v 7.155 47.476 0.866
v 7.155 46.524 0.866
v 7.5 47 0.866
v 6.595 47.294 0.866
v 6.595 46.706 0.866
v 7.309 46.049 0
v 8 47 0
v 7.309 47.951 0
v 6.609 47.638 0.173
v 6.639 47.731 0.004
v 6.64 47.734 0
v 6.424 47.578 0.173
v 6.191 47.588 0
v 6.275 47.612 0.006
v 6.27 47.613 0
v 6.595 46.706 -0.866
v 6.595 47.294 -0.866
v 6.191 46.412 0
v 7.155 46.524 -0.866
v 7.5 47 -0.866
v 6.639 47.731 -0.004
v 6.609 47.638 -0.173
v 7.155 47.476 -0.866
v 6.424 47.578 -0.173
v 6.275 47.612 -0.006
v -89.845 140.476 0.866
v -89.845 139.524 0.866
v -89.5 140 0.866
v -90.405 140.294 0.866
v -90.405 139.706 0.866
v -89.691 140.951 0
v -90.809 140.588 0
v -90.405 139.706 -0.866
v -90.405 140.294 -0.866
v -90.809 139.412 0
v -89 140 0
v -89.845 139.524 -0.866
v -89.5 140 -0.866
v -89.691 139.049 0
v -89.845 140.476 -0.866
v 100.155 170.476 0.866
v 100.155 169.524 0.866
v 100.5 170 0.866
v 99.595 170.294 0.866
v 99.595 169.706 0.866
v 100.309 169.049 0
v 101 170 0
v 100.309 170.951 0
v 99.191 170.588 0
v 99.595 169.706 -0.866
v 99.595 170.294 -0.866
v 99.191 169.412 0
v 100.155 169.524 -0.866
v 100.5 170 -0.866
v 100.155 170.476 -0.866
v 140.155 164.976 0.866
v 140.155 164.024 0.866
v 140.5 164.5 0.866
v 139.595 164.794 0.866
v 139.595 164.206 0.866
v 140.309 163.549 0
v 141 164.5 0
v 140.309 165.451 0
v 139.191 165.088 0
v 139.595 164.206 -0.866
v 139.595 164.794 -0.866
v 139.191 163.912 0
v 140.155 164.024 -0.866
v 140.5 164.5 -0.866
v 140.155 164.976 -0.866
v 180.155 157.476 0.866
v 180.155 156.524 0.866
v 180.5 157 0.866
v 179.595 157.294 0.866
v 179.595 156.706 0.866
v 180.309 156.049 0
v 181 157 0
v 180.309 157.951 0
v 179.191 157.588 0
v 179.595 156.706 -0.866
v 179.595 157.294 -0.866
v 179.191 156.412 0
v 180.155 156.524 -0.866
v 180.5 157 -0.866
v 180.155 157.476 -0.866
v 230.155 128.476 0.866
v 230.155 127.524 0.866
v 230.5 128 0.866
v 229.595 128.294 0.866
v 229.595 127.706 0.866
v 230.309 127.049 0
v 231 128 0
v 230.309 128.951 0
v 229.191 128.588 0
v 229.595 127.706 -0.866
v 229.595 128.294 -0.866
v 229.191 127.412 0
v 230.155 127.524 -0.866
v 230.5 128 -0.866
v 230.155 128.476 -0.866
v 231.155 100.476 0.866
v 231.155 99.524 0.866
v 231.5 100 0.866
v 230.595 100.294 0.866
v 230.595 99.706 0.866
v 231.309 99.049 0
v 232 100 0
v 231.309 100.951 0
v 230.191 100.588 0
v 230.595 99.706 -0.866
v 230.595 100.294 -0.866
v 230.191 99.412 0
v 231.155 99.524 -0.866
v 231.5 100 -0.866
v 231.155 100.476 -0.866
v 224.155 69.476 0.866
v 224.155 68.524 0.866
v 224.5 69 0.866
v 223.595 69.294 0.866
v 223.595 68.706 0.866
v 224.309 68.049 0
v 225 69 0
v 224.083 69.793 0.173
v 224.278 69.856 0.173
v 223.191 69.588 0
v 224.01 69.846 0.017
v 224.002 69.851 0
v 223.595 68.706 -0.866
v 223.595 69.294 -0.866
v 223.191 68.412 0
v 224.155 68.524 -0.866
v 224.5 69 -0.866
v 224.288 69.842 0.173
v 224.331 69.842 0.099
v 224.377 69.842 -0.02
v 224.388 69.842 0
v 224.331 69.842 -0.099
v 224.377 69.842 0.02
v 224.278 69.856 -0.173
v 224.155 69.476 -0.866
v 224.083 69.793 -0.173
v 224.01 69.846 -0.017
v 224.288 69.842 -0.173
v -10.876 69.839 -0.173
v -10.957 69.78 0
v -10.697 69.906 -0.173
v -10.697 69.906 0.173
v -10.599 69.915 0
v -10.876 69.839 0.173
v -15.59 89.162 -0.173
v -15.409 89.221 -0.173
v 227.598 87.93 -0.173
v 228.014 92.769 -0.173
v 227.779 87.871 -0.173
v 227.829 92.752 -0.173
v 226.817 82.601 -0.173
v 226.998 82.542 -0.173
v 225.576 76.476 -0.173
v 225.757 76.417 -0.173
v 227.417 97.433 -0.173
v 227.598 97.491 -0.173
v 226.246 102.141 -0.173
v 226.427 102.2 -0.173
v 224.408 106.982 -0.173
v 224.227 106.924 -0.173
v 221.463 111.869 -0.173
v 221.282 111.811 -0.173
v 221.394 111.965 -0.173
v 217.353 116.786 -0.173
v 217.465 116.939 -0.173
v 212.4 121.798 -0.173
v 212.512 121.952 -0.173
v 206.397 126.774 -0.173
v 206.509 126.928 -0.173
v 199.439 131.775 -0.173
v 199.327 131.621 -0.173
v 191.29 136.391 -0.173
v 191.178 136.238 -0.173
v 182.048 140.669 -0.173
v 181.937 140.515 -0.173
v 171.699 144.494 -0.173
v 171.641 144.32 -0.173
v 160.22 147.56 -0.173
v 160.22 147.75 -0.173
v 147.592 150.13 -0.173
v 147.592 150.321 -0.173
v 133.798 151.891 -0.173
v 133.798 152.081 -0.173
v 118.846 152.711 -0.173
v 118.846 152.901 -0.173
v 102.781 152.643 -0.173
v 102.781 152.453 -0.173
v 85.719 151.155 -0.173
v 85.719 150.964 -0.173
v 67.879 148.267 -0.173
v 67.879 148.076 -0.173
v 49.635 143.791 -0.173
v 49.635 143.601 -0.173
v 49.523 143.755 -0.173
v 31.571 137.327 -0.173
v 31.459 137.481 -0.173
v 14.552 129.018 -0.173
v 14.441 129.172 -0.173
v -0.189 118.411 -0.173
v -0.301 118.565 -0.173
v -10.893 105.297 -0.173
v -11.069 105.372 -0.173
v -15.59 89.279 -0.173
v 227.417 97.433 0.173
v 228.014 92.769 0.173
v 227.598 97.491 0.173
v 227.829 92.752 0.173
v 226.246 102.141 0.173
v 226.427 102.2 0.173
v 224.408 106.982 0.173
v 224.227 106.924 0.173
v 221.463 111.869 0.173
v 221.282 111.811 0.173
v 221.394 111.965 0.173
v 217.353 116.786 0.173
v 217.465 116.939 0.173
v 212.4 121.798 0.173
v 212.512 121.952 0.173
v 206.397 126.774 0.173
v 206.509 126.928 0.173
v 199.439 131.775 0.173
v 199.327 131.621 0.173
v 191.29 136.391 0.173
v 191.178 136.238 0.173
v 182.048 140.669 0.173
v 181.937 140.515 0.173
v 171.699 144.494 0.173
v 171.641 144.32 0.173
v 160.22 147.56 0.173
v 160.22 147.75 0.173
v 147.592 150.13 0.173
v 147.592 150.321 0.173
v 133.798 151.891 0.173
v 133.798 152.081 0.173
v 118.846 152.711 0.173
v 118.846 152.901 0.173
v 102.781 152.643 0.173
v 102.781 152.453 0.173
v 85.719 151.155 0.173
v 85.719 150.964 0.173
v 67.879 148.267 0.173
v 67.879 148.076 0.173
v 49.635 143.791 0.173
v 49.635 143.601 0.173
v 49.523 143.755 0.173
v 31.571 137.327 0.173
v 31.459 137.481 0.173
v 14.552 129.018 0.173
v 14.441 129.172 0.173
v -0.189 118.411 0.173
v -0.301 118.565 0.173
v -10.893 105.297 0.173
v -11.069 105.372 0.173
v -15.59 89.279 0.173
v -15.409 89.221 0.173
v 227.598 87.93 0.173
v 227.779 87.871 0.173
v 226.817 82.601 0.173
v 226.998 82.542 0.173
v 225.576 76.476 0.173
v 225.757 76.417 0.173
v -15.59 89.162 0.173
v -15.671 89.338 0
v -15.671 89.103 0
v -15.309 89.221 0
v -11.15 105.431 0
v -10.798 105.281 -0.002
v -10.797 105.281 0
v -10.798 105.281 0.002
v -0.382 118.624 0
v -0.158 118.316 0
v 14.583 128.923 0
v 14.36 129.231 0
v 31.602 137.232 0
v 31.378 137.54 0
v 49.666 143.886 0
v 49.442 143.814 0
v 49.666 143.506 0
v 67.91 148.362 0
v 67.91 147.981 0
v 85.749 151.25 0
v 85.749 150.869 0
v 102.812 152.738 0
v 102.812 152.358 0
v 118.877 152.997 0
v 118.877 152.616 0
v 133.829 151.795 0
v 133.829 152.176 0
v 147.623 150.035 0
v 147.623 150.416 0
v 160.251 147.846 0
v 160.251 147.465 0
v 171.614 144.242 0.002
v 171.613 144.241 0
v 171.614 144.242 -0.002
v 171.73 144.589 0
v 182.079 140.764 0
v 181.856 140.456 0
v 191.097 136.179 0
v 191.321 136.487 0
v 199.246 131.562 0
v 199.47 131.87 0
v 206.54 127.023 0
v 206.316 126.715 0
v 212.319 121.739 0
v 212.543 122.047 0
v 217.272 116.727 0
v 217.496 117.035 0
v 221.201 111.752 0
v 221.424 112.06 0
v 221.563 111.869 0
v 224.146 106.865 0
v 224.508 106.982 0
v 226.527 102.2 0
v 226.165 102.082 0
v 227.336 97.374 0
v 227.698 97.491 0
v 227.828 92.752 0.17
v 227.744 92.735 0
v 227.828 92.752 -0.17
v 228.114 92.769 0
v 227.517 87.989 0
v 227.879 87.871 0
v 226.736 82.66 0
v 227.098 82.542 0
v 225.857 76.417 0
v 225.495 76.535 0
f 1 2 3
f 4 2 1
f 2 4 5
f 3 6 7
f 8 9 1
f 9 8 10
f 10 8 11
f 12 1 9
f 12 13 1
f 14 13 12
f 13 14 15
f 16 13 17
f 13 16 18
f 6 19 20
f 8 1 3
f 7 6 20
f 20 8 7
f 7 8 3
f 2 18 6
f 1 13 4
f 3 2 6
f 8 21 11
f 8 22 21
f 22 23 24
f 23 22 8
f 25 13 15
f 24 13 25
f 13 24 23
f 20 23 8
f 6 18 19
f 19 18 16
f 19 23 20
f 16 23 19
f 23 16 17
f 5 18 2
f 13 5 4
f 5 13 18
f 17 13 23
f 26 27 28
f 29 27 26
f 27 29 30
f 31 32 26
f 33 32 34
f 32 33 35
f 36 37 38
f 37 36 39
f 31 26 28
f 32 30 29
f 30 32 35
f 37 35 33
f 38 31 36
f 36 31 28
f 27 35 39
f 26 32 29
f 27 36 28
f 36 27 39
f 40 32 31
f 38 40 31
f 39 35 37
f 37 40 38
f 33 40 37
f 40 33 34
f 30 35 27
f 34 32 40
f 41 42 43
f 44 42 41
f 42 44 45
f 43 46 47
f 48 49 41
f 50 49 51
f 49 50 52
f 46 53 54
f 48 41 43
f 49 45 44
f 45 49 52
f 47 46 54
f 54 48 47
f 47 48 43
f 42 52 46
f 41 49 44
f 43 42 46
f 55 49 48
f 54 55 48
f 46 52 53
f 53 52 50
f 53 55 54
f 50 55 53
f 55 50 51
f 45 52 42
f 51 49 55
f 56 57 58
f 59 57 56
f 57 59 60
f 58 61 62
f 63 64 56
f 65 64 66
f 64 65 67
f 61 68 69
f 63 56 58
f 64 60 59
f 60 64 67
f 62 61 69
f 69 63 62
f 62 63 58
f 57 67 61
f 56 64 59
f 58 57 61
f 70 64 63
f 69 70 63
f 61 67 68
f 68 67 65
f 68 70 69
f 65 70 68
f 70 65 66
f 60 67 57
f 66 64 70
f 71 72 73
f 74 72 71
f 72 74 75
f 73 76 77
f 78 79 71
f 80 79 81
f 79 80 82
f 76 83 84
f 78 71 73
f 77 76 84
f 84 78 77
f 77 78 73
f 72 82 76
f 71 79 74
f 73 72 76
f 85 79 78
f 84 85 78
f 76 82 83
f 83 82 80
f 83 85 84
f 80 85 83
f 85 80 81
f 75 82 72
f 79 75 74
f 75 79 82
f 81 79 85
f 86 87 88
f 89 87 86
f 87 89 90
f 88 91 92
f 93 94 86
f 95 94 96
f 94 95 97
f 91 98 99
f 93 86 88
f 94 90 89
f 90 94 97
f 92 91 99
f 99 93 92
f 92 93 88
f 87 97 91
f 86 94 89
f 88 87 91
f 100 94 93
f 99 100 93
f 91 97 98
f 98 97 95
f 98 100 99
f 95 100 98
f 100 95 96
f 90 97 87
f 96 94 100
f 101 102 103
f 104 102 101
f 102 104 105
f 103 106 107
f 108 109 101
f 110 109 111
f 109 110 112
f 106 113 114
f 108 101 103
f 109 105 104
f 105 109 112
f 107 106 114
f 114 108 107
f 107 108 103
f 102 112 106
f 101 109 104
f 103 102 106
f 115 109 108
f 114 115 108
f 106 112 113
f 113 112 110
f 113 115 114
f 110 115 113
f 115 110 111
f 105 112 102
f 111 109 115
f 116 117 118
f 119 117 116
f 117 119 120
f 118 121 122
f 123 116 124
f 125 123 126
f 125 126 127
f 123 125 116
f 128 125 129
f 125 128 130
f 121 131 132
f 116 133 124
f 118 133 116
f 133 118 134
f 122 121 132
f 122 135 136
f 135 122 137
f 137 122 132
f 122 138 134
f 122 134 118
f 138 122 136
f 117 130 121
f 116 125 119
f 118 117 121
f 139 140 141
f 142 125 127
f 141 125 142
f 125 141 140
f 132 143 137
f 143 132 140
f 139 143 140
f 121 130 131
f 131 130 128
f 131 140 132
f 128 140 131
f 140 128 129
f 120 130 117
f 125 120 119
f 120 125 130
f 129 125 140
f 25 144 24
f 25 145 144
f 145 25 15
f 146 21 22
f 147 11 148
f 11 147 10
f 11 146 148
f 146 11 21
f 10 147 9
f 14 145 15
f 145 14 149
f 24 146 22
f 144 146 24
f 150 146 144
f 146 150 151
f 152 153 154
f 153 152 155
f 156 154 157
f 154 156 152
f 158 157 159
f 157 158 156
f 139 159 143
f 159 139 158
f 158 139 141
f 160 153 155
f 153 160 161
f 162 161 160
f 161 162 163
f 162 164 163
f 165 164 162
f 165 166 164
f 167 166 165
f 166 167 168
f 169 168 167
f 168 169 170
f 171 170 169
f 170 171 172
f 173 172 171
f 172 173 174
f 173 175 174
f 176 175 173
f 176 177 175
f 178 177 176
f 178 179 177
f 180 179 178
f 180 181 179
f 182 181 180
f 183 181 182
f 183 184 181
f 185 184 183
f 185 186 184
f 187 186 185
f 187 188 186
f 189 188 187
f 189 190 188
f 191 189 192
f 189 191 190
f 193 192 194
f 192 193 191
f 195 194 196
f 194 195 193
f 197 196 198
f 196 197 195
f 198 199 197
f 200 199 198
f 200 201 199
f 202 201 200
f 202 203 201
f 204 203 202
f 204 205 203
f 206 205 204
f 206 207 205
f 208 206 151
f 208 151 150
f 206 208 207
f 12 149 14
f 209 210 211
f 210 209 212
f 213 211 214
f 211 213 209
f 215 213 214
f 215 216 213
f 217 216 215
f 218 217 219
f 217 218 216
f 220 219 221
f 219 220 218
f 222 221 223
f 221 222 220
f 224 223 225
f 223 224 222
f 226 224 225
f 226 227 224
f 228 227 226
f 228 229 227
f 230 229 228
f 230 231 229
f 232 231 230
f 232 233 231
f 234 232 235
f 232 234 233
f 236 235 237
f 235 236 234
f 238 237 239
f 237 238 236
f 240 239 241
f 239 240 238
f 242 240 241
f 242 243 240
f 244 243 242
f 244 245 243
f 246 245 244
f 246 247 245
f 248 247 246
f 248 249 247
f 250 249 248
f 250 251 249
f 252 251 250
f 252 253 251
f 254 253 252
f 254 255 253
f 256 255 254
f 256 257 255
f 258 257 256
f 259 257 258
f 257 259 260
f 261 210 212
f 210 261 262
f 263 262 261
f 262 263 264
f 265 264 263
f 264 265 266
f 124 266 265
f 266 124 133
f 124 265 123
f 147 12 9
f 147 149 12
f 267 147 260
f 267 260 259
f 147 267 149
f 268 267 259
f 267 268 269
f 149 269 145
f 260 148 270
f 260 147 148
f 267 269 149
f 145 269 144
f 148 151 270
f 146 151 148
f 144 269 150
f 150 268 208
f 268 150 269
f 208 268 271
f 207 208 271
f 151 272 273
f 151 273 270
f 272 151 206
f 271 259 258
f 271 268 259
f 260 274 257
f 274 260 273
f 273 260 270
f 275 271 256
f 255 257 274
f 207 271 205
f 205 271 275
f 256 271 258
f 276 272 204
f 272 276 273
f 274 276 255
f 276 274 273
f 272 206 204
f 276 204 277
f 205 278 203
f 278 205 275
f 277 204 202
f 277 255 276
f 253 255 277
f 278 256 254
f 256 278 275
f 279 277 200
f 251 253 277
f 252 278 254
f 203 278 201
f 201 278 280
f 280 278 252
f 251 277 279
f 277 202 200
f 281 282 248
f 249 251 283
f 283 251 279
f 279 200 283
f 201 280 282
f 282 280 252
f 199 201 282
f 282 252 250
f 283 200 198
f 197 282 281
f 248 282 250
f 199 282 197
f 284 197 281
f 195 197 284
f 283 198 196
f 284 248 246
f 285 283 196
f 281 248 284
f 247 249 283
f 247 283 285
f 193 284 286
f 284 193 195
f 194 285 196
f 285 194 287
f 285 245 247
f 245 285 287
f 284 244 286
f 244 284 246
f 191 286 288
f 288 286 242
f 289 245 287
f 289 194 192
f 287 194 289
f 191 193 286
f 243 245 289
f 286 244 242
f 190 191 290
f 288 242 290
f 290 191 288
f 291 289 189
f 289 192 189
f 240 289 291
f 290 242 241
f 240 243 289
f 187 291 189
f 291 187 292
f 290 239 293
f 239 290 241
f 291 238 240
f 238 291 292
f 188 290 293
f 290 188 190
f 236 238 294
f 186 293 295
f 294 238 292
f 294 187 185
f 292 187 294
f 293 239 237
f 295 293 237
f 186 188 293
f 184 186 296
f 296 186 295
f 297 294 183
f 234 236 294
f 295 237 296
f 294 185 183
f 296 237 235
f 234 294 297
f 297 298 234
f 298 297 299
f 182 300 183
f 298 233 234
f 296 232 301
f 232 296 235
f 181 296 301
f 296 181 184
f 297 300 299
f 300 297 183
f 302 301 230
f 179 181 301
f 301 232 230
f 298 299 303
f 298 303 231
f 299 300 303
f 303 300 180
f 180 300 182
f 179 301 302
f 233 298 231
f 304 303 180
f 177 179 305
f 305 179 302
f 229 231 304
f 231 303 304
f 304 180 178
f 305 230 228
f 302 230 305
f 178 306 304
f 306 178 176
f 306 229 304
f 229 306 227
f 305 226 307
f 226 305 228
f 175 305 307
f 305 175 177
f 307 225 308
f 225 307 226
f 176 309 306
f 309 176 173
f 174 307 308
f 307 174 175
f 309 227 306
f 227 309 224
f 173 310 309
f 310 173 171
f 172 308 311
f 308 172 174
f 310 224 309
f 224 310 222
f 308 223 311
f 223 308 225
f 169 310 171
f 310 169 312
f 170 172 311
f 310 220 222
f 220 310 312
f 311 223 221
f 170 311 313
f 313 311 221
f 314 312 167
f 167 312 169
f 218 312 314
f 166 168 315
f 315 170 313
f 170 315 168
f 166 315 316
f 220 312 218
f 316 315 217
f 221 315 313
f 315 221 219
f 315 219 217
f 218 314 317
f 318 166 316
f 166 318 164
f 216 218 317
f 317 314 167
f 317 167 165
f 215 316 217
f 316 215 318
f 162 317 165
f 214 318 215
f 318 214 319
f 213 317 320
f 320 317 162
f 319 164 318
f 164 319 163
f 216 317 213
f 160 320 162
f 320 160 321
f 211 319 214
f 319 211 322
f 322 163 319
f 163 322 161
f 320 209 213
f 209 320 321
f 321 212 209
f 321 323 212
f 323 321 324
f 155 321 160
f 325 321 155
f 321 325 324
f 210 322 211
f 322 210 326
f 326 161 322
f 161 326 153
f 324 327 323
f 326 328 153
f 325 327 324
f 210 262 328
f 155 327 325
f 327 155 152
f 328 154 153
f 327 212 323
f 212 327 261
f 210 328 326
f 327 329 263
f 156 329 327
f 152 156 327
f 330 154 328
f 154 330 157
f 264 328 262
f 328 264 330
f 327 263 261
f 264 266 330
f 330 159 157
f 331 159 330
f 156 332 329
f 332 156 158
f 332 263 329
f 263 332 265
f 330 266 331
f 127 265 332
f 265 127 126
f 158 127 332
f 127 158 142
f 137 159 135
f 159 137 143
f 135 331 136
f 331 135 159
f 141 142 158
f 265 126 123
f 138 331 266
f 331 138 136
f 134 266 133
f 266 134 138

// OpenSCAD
// https://www.raphaelluckom.com/posts/bezier_curves.html
// https://en.wikipedia.org/wiki/Binomial_coefficient
binomial_terms = [
                [1],                // n = 0
               [1, 1],              // n = 1
             [1, 2, 1],             // n = 2
            [1, 3, 3, 1],           // n = 3
          [1, 4, 6, 4, 1],          // n = 4
       [1, 5, 10, 10, 5, 1],        // n = 5
      [1, 6, 15, 20, 15, 6, 1],     // n = 6
    [1, 7, 21, 35, 35, 21, 7, 1],   // n = 7
  [1, 8, 28, 56, 70, 56, 28, 8, 1]  // n = 8
];
function bezier_coordinate(t, weights, term=0, total=0) =
  let (
     n = len(weights) - 1,
     binomial_row = binomial_terms[n],
     a = 1 - t,
     b = t,
     a_pow = n - term,
     b_pow = term
  )
  (term > n ? total : 
    bezier_coordinate(
      t,
      weights,
      term + 1,
      (
        total + (weights[term] * binomial_row[term] 
        * pow(a, a_pow) * pow(b, b_pow))
      )
    )
  );
function bezier_point(t, control_points) = 
  [
    bezier_coordinate(t, [for (point = control_points) point[0]]),
    bezier_coordinate(t, [for (point = control_points) point[1]]),
    bezier_coordinate(t, [for (point = control_points) point[2]]),
  ];

function bezier_curve_points(control_points, num_points) =
  [for (t=[0:num_points]) bezier_point(
    t * (1 / num_points), control_points
  )];

module draw_points(points) {
  for (point = points) {
    translate(point) children(0);
  }
}
module piecewise_join(points) {
  for (n=[1:len(points) - 1]) {
    hull() {
      translate(points[n-1]) children(0);
      translate(points[n]) children(0);
    }
  }
}

module bezier_curve(control_points, number_of_sections) {
  assert(len(control_points)<10,str("You can only have up to 9 points."));
  piecewise_join(
    bezier_curve_points(control_points, number_of_sections)
  ) children(0);
}

control_points = [
      [  7,   47,  0],   // 0
      [-90,  140,  0     ], // 1
      [100,  170,  0    ],  // 2
      [140,  164.5,  0    ],    // 3
      [180,  157,  0    ],    // 4
      [230,  128,  0    ],    // 5
      [231,  100,  0    ],    // 6
      [231,  100,  0    ],    // 6
      [224,   69,  0  ]    // 7
];

draw_points(control_points) sphere(1);
bezier_curve(control_points, 30) sphere(0.2);
